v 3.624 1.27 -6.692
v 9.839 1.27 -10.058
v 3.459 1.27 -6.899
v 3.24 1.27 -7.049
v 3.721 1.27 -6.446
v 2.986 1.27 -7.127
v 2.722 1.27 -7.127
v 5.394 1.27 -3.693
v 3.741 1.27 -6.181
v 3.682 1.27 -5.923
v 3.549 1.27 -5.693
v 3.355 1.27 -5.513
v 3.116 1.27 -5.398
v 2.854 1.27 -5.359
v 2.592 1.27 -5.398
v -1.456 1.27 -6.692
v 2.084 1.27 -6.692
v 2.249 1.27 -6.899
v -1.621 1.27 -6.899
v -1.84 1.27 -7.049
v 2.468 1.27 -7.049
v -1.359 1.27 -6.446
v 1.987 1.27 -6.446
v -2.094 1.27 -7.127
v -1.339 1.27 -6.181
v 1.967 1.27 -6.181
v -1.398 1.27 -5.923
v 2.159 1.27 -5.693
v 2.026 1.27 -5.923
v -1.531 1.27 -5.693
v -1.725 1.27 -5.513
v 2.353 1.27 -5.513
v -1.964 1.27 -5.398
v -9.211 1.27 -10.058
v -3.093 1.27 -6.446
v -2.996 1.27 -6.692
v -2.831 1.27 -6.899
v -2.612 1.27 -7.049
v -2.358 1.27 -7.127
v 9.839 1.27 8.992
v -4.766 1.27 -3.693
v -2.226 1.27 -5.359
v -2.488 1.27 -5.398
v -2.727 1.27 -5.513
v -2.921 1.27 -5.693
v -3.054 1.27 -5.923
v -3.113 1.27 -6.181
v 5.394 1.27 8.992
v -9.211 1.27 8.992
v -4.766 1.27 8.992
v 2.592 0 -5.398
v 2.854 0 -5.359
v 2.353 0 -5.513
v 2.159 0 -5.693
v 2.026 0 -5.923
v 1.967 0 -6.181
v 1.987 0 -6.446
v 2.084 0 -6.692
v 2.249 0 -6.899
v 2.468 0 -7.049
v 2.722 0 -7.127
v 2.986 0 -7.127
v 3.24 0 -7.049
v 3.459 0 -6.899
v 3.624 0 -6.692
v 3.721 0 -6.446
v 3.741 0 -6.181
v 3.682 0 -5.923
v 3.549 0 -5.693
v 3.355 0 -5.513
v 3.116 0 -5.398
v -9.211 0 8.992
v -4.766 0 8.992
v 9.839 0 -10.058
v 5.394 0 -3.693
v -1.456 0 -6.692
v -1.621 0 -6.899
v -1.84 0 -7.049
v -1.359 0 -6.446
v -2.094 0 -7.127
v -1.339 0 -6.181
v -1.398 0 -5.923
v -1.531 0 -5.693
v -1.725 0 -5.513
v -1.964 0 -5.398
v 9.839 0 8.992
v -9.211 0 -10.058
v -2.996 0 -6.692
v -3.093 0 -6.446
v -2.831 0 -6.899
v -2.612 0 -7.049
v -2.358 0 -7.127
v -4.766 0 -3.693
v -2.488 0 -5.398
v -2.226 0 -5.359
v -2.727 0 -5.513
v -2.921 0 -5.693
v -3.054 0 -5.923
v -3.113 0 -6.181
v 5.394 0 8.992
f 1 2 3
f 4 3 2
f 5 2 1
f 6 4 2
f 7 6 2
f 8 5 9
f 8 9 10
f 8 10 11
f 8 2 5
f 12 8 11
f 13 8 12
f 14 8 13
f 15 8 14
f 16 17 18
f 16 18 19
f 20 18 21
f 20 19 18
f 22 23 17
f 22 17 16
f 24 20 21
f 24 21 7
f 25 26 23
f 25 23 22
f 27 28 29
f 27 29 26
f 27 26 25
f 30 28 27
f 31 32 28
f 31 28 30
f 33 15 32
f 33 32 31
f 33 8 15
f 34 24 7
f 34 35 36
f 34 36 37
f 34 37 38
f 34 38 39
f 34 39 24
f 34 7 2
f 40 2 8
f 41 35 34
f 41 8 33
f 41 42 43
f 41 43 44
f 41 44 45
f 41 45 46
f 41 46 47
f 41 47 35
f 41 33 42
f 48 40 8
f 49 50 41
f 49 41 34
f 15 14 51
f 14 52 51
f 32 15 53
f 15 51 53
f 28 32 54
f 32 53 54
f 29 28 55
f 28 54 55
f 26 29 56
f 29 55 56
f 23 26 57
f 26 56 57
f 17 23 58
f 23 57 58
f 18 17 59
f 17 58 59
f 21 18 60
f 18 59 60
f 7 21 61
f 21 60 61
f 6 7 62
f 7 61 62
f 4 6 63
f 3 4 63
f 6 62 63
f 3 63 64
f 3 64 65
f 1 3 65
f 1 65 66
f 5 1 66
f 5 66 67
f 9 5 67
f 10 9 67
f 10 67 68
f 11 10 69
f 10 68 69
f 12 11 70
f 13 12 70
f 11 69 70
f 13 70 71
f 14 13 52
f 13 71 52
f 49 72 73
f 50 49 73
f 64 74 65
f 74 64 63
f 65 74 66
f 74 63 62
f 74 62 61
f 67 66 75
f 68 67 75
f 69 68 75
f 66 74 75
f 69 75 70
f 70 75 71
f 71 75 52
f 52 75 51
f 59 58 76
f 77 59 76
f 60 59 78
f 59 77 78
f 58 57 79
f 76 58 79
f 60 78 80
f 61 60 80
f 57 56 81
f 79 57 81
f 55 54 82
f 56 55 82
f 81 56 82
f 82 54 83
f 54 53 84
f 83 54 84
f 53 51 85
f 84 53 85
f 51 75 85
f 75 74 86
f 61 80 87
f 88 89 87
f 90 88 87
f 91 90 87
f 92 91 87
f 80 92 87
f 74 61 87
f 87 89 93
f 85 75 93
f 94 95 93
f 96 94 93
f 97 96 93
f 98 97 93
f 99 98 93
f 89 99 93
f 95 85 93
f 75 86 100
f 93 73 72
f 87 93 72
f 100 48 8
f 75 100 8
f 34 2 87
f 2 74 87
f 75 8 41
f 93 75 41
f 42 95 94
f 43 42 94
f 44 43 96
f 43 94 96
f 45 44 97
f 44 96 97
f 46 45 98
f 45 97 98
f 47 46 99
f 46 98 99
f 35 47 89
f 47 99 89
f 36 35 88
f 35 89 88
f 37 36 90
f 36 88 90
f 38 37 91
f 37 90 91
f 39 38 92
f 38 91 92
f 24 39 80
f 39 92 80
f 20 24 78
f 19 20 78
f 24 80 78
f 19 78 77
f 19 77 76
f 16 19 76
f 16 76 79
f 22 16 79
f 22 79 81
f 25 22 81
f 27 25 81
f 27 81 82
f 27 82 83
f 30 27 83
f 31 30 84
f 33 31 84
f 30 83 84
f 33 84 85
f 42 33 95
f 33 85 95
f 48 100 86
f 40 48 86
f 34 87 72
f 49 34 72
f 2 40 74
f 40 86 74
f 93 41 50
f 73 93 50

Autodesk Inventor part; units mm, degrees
ref_plane "YZ Plane" through (0, 0, 0) normal (1, 0, 0) x (0, 1, 0)
ref_plane "XZ Plane" through (0, 0, 0) normal (0, 1, 0) x (-1, 0, 0)
ref_plane "XY Plane" through (0, 0, 0) normal (0, 0, 1) x (1, 0, 0)
sketch "Sketch1" plane through (0, 0, 0) normal (0, 1, 0) x (-1, 0, 0)
  line L0 (9.211, 8.9923) -> (-9.839, 8.9923)
  line L1 (-9.839, 8.9923) -> (-9.839, -10.0577)
  line L2 (-9.839, -10.0577) -> (9.211, -10.0577)
  line L3 (9.211, -10.0577) -> (9.211, 8.9923)
  point P0 (0, 0)
  dimension "d0" = 19.05
  dimension "d1" = 19.05
extrude "Extrusion1" add sketch "Sketch1" along normal blind 1.27
sketch "Sketch2" plane through (0, 1.27, 0) normal (0, 1, 0) x (1, 0, 0)
  line L0 (-4.766, -9.0074) -> (5.394, -9.0074)
  line L1 (5.394, -9.0074) -> (5.394, 3.6926)
  line L2 (5.394, 3.6926) -> (-4.766, 3.6926)
  line L3 (-4.766, 3.6926) -> (-4.766, -9.0074)
  line L4 (-9.211, 10.0577) -> (-9.211, -8.9923) projected
  point P0 (0, 0)
  dimension "d4" = 4.445
  dimension "d5" = 10.16
  dimension "d6" = 12.7
extrude "Extrusion2" cut sketch "Sketch2" against normal up to next
hole "Hole1" at (-2.226, 1.27, -6.2477) direction (0, -1, 0) diameter 1.778 depth 1.27 clearance for "Flat Head Machine Screw (82)" size "#0" standard "Ansi Unified Screw Threads"
hole "Hole2" at (2.854, 1.27, -6.2477) direction (0, -1, 0) diameter 1.778 depth 1.27 clearance for "Flat Head Machine Screw (82)" size "#0" standard "Ansi Unified Screw Threads"
properties part number "Shutter"
